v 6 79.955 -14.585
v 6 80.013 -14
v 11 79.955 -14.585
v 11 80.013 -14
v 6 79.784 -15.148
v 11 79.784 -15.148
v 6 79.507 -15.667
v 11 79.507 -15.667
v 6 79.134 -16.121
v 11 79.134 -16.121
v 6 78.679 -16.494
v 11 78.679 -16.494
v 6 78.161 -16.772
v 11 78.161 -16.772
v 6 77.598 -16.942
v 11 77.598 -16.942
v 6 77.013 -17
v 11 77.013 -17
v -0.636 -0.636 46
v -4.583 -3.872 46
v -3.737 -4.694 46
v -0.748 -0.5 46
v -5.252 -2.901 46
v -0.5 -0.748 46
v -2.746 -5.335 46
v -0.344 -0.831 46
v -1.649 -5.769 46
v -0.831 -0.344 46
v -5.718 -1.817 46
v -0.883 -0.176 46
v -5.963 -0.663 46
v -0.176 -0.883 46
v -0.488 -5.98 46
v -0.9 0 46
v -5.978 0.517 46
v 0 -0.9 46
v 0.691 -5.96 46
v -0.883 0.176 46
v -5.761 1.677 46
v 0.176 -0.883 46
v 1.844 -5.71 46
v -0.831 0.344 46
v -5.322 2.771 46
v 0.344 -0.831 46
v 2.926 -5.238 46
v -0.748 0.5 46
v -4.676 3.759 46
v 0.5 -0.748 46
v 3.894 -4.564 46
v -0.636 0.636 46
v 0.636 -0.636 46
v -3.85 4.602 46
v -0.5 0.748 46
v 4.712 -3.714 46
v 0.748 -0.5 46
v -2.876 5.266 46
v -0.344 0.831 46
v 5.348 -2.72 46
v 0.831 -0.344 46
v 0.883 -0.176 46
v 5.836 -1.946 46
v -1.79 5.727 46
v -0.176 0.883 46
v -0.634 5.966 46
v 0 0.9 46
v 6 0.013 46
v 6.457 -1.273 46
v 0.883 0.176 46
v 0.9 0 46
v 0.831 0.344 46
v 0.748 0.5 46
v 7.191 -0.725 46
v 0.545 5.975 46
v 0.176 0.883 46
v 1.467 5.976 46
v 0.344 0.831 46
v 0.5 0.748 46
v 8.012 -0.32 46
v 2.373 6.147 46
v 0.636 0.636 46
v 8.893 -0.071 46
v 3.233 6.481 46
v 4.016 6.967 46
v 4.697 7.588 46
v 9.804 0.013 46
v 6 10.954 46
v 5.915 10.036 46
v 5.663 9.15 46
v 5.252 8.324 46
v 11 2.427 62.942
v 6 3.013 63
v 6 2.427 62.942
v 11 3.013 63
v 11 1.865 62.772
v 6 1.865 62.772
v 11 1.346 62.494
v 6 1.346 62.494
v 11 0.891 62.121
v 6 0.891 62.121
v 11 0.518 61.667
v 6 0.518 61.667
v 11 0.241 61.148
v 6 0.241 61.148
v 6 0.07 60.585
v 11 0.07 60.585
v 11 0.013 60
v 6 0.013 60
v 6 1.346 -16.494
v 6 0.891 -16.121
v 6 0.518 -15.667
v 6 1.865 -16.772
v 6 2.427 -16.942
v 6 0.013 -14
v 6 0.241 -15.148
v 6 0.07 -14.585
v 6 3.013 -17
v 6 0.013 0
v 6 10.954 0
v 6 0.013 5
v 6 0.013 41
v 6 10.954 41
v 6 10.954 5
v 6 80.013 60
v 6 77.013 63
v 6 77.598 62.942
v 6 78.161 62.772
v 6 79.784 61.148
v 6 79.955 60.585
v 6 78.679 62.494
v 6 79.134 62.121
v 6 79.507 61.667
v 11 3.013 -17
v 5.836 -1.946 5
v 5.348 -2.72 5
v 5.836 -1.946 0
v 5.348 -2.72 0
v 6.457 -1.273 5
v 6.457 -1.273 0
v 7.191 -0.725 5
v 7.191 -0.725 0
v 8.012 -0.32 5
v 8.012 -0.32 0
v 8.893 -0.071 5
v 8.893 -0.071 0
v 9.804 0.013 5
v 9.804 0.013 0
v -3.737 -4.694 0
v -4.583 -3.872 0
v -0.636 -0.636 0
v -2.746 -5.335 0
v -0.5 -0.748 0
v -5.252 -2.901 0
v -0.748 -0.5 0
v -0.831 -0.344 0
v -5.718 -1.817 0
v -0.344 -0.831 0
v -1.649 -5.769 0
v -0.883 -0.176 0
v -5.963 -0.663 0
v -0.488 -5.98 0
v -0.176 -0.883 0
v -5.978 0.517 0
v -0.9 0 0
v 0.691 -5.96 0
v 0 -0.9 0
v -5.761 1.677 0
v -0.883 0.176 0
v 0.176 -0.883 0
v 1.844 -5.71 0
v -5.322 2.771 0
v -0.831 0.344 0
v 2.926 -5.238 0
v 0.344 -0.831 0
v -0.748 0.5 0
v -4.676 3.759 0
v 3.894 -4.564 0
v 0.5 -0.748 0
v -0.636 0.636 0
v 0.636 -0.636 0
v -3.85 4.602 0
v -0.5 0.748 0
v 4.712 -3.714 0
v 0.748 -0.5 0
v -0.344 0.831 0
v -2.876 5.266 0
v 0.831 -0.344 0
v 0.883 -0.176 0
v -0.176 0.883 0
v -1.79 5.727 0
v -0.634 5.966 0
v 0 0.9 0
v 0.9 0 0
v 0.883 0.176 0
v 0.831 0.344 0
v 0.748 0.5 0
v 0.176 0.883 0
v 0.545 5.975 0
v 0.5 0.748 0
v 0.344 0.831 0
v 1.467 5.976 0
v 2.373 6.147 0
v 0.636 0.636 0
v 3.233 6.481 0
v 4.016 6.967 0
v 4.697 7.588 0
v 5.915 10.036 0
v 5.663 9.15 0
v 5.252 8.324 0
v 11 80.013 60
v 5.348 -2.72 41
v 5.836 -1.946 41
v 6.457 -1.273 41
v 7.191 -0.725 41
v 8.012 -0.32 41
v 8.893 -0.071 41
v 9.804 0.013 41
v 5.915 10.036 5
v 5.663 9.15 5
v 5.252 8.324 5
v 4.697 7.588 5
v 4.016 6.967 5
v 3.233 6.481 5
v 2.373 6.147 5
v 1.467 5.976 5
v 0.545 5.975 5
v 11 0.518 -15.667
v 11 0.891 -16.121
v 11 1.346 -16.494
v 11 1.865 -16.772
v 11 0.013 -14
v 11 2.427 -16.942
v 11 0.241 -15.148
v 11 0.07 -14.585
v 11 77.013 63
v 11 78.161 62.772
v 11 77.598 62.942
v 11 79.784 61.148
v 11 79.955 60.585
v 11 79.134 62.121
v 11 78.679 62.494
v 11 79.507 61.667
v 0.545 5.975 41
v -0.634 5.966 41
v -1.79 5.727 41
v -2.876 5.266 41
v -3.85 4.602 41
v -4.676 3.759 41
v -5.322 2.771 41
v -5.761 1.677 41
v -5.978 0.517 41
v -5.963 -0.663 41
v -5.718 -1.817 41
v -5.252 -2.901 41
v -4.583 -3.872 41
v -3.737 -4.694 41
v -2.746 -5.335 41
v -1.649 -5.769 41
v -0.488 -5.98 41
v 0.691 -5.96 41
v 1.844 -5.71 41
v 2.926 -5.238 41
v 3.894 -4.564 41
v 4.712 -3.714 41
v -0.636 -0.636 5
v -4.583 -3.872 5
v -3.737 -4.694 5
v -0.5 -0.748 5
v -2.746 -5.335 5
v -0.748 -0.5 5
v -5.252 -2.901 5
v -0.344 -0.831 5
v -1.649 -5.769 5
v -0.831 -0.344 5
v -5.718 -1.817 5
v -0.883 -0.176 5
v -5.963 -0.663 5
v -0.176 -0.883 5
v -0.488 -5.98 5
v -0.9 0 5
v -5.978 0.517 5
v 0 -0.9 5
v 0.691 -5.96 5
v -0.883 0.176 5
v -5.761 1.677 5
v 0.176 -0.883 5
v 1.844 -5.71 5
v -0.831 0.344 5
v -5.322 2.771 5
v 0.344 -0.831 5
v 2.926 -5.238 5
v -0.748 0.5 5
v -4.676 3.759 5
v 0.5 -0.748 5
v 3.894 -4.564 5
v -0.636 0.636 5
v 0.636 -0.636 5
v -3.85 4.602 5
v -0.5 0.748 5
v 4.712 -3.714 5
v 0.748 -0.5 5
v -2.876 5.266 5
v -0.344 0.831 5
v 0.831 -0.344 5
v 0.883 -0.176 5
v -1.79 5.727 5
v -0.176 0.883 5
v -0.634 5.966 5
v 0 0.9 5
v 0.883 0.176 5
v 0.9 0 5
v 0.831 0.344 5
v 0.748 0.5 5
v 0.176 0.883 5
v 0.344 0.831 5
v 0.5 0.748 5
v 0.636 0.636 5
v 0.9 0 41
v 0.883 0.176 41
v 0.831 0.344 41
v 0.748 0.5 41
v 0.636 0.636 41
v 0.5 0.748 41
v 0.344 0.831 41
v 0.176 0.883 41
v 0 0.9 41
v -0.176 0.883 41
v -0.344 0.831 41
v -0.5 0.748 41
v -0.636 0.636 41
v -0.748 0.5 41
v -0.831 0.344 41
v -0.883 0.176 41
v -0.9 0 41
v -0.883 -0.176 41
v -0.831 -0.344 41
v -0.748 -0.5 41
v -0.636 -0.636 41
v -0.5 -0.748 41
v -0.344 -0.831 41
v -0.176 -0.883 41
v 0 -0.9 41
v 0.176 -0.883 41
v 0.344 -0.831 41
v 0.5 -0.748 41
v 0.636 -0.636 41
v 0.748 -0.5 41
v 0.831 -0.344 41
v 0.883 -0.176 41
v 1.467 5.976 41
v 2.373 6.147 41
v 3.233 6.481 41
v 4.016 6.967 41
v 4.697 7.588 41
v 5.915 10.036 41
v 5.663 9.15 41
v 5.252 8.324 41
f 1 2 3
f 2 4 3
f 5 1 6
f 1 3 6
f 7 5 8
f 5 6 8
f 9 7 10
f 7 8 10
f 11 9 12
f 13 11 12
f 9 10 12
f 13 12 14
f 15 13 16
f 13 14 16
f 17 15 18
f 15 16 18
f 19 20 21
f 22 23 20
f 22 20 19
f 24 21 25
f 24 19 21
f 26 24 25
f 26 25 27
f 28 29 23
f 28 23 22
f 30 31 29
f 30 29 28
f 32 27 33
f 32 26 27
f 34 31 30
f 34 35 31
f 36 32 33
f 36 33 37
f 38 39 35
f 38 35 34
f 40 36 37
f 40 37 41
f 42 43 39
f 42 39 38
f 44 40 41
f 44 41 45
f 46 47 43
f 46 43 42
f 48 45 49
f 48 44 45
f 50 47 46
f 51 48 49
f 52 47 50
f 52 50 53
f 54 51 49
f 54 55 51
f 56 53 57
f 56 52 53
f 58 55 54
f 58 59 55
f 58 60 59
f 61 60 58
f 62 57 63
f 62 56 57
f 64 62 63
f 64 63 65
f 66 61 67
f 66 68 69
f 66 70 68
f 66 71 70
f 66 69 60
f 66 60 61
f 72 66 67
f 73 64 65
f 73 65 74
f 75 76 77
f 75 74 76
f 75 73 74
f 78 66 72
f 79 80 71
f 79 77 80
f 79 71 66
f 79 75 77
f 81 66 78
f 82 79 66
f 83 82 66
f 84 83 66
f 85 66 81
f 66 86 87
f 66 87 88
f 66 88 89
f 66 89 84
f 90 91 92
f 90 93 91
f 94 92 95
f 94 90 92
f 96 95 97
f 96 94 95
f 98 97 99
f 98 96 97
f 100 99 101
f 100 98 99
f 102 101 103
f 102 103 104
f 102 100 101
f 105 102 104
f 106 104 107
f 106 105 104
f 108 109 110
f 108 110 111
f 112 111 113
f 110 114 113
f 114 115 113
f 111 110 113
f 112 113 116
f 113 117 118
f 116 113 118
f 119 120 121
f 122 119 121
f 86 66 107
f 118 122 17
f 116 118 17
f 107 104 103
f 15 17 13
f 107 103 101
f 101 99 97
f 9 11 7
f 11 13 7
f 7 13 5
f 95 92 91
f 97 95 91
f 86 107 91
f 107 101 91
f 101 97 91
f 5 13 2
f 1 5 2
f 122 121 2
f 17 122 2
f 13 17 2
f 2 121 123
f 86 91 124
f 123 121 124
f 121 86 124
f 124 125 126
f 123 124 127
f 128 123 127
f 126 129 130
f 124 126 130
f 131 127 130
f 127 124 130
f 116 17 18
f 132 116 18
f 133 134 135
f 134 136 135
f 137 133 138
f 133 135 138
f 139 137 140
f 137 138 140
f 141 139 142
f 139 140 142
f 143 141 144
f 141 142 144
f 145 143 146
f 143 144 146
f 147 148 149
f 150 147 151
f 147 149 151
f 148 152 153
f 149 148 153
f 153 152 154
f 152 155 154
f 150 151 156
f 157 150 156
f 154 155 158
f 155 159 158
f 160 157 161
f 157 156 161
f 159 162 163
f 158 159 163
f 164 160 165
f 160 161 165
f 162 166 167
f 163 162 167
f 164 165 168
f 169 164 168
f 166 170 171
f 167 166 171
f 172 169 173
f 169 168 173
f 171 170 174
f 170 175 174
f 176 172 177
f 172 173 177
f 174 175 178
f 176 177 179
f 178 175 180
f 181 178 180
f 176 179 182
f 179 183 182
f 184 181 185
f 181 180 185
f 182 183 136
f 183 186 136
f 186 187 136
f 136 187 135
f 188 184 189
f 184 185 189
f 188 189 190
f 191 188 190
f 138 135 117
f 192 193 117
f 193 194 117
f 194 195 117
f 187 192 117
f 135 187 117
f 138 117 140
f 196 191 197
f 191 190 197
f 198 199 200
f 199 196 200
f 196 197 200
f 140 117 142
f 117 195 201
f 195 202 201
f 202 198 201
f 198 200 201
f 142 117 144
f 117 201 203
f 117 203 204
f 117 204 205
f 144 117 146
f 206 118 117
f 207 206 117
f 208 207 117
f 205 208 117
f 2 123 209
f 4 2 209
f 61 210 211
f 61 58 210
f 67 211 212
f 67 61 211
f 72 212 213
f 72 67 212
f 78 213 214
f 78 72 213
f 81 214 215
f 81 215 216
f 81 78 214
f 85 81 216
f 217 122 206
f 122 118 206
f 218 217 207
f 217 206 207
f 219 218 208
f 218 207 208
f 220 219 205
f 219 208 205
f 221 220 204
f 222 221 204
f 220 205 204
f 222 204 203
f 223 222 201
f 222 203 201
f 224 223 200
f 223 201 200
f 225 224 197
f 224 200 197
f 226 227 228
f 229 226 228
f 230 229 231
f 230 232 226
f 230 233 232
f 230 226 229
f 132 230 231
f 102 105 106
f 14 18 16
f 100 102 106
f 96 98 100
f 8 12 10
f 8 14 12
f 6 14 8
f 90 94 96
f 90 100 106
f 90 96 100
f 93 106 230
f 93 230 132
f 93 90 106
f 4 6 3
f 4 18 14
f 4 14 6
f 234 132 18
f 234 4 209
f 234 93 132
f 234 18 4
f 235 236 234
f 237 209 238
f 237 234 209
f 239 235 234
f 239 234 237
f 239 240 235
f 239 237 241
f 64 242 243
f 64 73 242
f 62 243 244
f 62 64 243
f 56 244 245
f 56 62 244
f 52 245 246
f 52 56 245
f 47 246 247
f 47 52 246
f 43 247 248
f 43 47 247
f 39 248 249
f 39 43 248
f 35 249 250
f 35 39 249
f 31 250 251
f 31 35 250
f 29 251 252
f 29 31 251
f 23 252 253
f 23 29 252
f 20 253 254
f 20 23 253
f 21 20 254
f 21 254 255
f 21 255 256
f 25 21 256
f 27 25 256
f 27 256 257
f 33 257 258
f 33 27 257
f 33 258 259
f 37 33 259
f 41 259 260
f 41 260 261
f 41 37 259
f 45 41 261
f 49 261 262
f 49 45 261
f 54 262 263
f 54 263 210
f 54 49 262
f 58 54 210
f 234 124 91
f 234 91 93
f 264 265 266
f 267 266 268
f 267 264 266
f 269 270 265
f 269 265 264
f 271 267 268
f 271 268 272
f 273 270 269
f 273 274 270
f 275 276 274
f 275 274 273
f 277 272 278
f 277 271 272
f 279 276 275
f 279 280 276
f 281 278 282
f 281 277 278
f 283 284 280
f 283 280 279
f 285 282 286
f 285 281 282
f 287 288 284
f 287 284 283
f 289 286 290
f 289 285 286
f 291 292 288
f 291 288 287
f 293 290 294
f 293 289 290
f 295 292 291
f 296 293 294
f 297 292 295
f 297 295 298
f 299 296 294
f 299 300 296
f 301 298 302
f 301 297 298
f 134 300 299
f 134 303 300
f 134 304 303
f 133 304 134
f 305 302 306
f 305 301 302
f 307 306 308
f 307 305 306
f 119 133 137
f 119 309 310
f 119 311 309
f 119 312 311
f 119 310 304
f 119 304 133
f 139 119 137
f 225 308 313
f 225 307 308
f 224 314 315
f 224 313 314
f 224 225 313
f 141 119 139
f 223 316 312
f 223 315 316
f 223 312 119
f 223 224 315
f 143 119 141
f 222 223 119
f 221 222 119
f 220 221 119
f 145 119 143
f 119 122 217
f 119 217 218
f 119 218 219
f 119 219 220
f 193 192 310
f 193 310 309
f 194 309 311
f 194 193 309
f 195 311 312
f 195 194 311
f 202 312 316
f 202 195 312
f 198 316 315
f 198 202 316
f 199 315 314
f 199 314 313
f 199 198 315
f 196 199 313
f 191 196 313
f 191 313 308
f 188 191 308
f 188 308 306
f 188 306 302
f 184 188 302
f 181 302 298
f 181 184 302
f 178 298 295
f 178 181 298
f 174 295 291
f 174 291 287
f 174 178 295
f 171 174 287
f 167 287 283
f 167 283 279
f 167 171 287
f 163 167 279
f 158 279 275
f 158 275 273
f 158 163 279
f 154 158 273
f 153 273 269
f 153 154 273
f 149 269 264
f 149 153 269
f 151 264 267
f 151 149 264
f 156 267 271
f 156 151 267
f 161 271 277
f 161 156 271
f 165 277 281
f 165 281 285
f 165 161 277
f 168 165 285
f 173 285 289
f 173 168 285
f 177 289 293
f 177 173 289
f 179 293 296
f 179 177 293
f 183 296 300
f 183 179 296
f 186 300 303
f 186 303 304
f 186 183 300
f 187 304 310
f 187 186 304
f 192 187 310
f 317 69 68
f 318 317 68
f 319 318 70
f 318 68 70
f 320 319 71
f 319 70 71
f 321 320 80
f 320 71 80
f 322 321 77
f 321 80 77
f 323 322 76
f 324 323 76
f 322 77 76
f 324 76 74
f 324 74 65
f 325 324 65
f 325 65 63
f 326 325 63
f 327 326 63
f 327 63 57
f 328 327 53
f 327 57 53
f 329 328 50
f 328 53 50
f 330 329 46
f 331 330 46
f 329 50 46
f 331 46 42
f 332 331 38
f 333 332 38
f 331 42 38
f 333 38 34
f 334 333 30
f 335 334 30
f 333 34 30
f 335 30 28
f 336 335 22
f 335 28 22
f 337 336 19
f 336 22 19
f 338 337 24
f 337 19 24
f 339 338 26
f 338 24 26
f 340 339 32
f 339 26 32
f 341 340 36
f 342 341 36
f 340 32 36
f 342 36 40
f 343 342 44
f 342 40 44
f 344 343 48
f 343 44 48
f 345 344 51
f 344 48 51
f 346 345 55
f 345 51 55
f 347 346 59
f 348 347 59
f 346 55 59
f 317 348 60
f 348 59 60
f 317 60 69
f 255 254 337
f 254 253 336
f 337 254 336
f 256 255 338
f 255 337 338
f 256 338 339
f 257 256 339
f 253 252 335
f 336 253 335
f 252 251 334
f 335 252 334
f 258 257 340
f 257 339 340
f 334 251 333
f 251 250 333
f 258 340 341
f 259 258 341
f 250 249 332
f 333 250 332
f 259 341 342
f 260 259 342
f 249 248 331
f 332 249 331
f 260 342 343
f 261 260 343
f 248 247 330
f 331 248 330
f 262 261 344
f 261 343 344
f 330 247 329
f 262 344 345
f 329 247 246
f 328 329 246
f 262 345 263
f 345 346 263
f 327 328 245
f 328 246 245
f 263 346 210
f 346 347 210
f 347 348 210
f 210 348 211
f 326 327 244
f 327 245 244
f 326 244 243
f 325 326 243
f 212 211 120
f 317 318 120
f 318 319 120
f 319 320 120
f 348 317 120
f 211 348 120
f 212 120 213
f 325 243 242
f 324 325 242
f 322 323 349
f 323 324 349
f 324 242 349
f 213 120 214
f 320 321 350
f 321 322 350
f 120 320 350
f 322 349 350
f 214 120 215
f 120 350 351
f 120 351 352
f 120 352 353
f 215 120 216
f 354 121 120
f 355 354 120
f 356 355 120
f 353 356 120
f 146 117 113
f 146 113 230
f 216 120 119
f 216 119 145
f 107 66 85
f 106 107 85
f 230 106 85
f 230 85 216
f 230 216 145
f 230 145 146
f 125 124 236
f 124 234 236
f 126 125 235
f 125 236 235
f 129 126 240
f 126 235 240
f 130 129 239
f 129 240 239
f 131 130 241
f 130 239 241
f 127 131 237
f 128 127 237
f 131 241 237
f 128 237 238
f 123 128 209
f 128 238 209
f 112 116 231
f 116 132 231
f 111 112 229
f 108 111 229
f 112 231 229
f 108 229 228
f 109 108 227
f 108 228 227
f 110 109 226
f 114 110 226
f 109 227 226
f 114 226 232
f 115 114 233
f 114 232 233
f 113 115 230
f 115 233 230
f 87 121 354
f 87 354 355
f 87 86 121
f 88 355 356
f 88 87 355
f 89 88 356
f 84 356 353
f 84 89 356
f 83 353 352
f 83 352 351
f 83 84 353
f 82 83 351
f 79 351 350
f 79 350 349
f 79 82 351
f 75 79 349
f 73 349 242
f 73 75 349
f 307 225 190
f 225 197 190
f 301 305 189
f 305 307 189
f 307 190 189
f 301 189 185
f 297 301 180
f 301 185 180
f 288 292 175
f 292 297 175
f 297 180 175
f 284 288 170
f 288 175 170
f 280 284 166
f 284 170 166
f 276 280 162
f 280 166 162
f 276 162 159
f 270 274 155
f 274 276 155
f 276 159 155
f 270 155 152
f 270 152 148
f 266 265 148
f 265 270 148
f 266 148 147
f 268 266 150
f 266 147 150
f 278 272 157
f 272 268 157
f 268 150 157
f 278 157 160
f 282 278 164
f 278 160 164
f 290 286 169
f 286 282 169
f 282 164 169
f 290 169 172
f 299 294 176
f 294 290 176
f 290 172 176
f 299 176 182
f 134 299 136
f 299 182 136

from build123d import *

# Parameters (mm, degrees)
F0_R          = 6
F0_R_2        = 0.9
F1_DEPTH      = 5
F3_R          = 6
F3_R_2        = 0.9
F4_DEPTH      = 5
F5_W          = 5
F5_H          = 80
F6_DEPTH      = 63
F6_DEPTH_BACK = 17
F7_R          = 5
F8_R          = 3


with BuildPart() as f1:
    # F0 (on Top) → F1 (new body)
    with BuildSketch(Plane.XY):
        Circle(F0_R)
        Circle(F0_R_2, mode=Mode.SUBTRACT)
    extrude(amount=F1_DEPTH)



with BuildPart() as f4:
    # F3 (on offset) → F4 (new body)
    with BuildSketch(Plane.XY.offset(46)):
        Circle(F3_R)
        Circle(F3_R_2, mode=Mode.SUBTRACT)
    extrude(amount=-F4_DEPTH)


with BuildPart() as f1_1:
    add(f1.part)

    add(f4.part)  # F6 merges F4
    # F5 (on Top) → F6 (join, two sides)
    with BuildSketch(Plane.XY) as f6_sk:
        with Locations((8.4999, 40.012752)):
            Rectangle(F5_W, F5_H)
    extrude(amount=F6_DEPTH)
    extrude(f6_sk.sketch, amount=-F6_DEPTH_BACK)

    # F7
    f7_edges = [f1_1.edges().sort_by_distance(p)[0] for p in [
        (5.9999, 0.034641, 43.5),
        (5.9999, 0.034641, 2.5),
        (5.999986, 0.012752, 2.5),
        (5.999986, 0.012752, 43.5),
    ]]
    fillet(f7_edges, radius=F7_R)

    # F8
    f8_edges = [f1_1.edges().sort_by_distance(p)[0] for p in [
        (8.4999, 80.012752, 63),
        (8.4999, 0.012752, 63),
        (8.4999, 80.012752, -17),
        (8.4999, 0.012752, -17),
    ]]
    fillet(f8_edges, radius=F8_R)


solid = f1_1.part
